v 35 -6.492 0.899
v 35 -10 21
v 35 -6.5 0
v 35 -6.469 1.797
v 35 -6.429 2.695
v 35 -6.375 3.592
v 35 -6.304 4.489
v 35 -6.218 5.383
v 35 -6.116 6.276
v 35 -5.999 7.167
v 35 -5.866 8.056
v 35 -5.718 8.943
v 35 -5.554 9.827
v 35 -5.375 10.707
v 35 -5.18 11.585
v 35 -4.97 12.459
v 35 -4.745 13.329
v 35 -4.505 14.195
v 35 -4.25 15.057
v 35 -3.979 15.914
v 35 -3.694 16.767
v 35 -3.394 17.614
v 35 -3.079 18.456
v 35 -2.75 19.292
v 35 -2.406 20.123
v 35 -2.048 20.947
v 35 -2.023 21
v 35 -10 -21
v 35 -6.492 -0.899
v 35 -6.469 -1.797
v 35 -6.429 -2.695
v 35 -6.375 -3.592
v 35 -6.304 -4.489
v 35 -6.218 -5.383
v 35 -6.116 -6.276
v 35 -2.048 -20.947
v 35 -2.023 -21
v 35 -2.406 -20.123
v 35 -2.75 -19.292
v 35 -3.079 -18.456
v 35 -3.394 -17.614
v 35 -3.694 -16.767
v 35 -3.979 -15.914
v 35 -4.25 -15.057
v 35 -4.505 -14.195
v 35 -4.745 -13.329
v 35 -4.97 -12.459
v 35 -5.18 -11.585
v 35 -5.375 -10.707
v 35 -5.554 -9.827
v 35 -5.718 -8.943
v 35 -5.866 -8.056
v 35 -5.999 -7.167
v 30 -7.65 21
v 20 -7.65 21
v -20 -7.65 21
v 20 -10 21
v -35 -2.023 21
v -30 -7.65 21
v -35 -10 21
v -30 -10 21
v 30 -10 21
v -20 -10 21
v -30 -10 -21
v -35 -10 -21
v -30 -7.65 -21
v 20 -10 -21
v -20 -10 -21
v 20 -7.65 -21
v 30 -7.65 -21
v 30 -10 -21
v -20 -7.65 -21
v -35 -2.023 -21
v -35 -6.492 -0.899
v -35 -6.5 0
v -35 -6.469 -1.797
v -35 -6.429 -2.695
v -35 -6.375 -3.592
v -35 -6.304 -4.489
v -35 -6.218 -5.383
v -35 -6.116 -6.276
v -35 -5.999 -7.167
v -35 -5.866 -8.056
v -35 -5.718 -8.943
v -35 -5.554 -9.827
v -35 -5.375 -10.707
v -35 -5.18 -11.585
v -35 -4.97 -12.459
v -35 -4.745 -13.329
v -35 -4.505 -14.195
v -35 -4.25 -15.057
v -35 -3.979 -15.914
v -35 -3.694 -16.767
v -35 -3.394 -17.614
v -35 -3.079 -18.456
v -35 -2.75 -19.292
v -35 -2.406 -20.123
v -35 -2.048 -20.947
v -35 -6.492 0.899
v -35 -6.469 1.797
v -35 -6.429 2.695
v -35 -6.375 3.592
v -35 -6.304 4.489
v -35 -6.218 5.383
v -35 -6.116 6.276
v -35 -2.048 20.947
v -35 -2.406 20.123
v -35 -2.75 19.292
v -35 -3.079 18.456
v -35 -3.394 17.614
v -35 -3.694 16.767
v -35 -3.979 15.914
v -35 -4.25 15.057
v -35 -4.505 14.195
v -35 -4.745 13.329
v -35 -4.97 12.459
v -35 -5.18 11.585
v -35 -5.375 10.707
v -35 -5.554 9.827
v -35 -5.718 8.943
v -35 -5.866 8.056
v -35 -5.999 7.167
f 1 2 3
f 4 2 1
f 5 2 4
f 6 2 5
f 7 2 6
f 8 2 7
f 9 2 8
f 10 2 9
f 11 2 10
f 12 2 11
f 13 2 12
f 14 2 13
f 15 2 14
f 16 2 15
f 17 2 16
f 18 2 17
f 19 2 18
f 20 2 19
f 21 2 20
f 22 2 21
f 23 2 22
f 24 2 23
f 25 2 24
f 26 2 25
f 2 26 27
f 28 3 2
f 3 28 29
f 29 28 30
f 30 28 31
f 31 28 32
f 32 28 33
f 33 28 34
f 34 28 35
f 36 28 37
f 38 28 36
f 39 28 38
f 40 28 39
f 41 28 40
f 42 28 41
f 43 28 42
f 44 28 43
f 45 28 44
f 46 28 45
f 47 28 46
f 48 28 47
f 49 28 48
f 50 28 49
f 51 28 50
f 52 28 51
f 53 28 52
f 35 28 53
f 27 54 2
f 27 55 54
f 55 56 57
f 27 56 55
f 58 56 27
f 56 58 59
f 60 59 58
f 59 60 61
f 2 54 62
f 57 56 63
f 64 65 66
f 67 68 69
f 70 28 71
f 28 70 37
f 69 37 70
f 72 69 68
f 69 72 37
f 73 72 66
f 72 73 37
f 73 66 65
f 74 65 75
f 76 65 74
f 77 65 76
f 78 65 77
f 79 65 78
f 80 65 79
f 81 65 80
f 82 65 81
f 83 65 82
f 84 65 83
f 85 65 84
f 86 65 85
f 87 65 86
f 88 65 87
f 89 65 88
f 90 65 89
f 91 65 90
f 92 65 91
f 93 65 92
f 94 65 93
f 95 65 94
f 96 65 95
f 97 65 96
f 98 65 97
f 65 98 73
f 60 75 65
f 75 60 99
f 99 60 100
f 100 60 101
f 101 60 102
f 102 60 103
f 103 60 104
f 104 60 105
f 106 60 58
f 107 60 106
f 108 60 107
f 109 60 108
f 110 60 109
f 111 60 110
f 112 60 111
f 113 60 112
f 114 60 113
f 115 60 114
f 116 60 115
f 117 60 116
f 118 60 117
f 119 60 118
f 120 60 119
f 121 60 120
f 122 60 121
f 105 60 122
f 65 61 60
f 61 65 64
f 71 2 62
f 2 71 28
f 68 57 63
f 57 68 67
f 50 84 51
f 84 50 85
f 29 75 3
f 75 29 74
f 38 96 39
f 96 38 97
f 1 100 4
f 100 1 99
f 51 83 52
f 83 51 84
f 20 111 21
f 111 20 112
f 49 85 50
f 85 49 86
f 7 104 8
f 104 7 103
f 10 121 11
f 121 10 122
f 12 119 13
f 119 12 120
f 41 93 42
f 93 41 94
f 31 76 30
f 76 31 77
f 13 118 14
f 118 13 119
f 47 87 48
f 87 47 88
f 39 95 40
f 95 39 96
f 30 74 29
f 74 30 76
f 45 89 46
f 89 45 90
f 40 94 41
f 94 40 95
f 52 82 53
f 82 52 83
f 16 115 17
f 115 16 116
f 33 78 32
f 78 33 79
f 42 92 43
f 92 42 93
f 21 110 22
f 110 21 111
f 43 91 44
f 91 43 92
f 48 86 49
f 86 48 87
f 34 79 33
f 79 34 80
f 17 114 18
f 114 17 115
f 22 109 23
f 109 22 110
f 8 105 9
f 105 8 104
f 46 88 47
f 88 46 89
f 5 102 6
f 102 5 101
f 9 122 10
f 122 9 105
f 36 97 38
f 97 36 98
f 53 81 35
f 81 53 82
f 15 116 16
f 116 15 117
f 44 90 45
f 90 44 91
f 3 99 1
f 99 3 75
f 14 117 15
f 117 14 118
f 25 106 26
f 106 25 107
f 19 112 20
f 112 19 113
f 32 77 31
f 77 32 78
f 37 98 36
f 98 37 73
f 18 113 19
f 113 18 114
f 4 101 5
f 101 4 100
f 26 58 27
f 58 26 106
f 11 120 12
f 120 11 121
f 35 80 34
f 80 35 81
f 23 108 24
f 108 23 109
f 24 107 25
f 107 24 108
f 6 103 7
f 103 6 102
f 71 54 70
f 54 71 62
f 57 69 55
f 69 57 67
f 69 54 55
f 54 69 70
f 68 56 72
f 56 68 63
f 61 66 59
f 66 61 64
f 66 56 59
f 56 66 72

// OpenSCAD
d = 103;

difference() {
cube(size = [70,20,42], center = true);

translate([0,45,0])
    rotate([0,90,0])
        cylinder(h=80, r1=d/2, r2=d/2, center=true, $fn=360);
    
translate([25,-8.9,0])
    cube(size = [10,2.5,60], center = true);
translate([-25,-8.9,0])
    cube(size = [10,2.5,60], center = true);    
}
